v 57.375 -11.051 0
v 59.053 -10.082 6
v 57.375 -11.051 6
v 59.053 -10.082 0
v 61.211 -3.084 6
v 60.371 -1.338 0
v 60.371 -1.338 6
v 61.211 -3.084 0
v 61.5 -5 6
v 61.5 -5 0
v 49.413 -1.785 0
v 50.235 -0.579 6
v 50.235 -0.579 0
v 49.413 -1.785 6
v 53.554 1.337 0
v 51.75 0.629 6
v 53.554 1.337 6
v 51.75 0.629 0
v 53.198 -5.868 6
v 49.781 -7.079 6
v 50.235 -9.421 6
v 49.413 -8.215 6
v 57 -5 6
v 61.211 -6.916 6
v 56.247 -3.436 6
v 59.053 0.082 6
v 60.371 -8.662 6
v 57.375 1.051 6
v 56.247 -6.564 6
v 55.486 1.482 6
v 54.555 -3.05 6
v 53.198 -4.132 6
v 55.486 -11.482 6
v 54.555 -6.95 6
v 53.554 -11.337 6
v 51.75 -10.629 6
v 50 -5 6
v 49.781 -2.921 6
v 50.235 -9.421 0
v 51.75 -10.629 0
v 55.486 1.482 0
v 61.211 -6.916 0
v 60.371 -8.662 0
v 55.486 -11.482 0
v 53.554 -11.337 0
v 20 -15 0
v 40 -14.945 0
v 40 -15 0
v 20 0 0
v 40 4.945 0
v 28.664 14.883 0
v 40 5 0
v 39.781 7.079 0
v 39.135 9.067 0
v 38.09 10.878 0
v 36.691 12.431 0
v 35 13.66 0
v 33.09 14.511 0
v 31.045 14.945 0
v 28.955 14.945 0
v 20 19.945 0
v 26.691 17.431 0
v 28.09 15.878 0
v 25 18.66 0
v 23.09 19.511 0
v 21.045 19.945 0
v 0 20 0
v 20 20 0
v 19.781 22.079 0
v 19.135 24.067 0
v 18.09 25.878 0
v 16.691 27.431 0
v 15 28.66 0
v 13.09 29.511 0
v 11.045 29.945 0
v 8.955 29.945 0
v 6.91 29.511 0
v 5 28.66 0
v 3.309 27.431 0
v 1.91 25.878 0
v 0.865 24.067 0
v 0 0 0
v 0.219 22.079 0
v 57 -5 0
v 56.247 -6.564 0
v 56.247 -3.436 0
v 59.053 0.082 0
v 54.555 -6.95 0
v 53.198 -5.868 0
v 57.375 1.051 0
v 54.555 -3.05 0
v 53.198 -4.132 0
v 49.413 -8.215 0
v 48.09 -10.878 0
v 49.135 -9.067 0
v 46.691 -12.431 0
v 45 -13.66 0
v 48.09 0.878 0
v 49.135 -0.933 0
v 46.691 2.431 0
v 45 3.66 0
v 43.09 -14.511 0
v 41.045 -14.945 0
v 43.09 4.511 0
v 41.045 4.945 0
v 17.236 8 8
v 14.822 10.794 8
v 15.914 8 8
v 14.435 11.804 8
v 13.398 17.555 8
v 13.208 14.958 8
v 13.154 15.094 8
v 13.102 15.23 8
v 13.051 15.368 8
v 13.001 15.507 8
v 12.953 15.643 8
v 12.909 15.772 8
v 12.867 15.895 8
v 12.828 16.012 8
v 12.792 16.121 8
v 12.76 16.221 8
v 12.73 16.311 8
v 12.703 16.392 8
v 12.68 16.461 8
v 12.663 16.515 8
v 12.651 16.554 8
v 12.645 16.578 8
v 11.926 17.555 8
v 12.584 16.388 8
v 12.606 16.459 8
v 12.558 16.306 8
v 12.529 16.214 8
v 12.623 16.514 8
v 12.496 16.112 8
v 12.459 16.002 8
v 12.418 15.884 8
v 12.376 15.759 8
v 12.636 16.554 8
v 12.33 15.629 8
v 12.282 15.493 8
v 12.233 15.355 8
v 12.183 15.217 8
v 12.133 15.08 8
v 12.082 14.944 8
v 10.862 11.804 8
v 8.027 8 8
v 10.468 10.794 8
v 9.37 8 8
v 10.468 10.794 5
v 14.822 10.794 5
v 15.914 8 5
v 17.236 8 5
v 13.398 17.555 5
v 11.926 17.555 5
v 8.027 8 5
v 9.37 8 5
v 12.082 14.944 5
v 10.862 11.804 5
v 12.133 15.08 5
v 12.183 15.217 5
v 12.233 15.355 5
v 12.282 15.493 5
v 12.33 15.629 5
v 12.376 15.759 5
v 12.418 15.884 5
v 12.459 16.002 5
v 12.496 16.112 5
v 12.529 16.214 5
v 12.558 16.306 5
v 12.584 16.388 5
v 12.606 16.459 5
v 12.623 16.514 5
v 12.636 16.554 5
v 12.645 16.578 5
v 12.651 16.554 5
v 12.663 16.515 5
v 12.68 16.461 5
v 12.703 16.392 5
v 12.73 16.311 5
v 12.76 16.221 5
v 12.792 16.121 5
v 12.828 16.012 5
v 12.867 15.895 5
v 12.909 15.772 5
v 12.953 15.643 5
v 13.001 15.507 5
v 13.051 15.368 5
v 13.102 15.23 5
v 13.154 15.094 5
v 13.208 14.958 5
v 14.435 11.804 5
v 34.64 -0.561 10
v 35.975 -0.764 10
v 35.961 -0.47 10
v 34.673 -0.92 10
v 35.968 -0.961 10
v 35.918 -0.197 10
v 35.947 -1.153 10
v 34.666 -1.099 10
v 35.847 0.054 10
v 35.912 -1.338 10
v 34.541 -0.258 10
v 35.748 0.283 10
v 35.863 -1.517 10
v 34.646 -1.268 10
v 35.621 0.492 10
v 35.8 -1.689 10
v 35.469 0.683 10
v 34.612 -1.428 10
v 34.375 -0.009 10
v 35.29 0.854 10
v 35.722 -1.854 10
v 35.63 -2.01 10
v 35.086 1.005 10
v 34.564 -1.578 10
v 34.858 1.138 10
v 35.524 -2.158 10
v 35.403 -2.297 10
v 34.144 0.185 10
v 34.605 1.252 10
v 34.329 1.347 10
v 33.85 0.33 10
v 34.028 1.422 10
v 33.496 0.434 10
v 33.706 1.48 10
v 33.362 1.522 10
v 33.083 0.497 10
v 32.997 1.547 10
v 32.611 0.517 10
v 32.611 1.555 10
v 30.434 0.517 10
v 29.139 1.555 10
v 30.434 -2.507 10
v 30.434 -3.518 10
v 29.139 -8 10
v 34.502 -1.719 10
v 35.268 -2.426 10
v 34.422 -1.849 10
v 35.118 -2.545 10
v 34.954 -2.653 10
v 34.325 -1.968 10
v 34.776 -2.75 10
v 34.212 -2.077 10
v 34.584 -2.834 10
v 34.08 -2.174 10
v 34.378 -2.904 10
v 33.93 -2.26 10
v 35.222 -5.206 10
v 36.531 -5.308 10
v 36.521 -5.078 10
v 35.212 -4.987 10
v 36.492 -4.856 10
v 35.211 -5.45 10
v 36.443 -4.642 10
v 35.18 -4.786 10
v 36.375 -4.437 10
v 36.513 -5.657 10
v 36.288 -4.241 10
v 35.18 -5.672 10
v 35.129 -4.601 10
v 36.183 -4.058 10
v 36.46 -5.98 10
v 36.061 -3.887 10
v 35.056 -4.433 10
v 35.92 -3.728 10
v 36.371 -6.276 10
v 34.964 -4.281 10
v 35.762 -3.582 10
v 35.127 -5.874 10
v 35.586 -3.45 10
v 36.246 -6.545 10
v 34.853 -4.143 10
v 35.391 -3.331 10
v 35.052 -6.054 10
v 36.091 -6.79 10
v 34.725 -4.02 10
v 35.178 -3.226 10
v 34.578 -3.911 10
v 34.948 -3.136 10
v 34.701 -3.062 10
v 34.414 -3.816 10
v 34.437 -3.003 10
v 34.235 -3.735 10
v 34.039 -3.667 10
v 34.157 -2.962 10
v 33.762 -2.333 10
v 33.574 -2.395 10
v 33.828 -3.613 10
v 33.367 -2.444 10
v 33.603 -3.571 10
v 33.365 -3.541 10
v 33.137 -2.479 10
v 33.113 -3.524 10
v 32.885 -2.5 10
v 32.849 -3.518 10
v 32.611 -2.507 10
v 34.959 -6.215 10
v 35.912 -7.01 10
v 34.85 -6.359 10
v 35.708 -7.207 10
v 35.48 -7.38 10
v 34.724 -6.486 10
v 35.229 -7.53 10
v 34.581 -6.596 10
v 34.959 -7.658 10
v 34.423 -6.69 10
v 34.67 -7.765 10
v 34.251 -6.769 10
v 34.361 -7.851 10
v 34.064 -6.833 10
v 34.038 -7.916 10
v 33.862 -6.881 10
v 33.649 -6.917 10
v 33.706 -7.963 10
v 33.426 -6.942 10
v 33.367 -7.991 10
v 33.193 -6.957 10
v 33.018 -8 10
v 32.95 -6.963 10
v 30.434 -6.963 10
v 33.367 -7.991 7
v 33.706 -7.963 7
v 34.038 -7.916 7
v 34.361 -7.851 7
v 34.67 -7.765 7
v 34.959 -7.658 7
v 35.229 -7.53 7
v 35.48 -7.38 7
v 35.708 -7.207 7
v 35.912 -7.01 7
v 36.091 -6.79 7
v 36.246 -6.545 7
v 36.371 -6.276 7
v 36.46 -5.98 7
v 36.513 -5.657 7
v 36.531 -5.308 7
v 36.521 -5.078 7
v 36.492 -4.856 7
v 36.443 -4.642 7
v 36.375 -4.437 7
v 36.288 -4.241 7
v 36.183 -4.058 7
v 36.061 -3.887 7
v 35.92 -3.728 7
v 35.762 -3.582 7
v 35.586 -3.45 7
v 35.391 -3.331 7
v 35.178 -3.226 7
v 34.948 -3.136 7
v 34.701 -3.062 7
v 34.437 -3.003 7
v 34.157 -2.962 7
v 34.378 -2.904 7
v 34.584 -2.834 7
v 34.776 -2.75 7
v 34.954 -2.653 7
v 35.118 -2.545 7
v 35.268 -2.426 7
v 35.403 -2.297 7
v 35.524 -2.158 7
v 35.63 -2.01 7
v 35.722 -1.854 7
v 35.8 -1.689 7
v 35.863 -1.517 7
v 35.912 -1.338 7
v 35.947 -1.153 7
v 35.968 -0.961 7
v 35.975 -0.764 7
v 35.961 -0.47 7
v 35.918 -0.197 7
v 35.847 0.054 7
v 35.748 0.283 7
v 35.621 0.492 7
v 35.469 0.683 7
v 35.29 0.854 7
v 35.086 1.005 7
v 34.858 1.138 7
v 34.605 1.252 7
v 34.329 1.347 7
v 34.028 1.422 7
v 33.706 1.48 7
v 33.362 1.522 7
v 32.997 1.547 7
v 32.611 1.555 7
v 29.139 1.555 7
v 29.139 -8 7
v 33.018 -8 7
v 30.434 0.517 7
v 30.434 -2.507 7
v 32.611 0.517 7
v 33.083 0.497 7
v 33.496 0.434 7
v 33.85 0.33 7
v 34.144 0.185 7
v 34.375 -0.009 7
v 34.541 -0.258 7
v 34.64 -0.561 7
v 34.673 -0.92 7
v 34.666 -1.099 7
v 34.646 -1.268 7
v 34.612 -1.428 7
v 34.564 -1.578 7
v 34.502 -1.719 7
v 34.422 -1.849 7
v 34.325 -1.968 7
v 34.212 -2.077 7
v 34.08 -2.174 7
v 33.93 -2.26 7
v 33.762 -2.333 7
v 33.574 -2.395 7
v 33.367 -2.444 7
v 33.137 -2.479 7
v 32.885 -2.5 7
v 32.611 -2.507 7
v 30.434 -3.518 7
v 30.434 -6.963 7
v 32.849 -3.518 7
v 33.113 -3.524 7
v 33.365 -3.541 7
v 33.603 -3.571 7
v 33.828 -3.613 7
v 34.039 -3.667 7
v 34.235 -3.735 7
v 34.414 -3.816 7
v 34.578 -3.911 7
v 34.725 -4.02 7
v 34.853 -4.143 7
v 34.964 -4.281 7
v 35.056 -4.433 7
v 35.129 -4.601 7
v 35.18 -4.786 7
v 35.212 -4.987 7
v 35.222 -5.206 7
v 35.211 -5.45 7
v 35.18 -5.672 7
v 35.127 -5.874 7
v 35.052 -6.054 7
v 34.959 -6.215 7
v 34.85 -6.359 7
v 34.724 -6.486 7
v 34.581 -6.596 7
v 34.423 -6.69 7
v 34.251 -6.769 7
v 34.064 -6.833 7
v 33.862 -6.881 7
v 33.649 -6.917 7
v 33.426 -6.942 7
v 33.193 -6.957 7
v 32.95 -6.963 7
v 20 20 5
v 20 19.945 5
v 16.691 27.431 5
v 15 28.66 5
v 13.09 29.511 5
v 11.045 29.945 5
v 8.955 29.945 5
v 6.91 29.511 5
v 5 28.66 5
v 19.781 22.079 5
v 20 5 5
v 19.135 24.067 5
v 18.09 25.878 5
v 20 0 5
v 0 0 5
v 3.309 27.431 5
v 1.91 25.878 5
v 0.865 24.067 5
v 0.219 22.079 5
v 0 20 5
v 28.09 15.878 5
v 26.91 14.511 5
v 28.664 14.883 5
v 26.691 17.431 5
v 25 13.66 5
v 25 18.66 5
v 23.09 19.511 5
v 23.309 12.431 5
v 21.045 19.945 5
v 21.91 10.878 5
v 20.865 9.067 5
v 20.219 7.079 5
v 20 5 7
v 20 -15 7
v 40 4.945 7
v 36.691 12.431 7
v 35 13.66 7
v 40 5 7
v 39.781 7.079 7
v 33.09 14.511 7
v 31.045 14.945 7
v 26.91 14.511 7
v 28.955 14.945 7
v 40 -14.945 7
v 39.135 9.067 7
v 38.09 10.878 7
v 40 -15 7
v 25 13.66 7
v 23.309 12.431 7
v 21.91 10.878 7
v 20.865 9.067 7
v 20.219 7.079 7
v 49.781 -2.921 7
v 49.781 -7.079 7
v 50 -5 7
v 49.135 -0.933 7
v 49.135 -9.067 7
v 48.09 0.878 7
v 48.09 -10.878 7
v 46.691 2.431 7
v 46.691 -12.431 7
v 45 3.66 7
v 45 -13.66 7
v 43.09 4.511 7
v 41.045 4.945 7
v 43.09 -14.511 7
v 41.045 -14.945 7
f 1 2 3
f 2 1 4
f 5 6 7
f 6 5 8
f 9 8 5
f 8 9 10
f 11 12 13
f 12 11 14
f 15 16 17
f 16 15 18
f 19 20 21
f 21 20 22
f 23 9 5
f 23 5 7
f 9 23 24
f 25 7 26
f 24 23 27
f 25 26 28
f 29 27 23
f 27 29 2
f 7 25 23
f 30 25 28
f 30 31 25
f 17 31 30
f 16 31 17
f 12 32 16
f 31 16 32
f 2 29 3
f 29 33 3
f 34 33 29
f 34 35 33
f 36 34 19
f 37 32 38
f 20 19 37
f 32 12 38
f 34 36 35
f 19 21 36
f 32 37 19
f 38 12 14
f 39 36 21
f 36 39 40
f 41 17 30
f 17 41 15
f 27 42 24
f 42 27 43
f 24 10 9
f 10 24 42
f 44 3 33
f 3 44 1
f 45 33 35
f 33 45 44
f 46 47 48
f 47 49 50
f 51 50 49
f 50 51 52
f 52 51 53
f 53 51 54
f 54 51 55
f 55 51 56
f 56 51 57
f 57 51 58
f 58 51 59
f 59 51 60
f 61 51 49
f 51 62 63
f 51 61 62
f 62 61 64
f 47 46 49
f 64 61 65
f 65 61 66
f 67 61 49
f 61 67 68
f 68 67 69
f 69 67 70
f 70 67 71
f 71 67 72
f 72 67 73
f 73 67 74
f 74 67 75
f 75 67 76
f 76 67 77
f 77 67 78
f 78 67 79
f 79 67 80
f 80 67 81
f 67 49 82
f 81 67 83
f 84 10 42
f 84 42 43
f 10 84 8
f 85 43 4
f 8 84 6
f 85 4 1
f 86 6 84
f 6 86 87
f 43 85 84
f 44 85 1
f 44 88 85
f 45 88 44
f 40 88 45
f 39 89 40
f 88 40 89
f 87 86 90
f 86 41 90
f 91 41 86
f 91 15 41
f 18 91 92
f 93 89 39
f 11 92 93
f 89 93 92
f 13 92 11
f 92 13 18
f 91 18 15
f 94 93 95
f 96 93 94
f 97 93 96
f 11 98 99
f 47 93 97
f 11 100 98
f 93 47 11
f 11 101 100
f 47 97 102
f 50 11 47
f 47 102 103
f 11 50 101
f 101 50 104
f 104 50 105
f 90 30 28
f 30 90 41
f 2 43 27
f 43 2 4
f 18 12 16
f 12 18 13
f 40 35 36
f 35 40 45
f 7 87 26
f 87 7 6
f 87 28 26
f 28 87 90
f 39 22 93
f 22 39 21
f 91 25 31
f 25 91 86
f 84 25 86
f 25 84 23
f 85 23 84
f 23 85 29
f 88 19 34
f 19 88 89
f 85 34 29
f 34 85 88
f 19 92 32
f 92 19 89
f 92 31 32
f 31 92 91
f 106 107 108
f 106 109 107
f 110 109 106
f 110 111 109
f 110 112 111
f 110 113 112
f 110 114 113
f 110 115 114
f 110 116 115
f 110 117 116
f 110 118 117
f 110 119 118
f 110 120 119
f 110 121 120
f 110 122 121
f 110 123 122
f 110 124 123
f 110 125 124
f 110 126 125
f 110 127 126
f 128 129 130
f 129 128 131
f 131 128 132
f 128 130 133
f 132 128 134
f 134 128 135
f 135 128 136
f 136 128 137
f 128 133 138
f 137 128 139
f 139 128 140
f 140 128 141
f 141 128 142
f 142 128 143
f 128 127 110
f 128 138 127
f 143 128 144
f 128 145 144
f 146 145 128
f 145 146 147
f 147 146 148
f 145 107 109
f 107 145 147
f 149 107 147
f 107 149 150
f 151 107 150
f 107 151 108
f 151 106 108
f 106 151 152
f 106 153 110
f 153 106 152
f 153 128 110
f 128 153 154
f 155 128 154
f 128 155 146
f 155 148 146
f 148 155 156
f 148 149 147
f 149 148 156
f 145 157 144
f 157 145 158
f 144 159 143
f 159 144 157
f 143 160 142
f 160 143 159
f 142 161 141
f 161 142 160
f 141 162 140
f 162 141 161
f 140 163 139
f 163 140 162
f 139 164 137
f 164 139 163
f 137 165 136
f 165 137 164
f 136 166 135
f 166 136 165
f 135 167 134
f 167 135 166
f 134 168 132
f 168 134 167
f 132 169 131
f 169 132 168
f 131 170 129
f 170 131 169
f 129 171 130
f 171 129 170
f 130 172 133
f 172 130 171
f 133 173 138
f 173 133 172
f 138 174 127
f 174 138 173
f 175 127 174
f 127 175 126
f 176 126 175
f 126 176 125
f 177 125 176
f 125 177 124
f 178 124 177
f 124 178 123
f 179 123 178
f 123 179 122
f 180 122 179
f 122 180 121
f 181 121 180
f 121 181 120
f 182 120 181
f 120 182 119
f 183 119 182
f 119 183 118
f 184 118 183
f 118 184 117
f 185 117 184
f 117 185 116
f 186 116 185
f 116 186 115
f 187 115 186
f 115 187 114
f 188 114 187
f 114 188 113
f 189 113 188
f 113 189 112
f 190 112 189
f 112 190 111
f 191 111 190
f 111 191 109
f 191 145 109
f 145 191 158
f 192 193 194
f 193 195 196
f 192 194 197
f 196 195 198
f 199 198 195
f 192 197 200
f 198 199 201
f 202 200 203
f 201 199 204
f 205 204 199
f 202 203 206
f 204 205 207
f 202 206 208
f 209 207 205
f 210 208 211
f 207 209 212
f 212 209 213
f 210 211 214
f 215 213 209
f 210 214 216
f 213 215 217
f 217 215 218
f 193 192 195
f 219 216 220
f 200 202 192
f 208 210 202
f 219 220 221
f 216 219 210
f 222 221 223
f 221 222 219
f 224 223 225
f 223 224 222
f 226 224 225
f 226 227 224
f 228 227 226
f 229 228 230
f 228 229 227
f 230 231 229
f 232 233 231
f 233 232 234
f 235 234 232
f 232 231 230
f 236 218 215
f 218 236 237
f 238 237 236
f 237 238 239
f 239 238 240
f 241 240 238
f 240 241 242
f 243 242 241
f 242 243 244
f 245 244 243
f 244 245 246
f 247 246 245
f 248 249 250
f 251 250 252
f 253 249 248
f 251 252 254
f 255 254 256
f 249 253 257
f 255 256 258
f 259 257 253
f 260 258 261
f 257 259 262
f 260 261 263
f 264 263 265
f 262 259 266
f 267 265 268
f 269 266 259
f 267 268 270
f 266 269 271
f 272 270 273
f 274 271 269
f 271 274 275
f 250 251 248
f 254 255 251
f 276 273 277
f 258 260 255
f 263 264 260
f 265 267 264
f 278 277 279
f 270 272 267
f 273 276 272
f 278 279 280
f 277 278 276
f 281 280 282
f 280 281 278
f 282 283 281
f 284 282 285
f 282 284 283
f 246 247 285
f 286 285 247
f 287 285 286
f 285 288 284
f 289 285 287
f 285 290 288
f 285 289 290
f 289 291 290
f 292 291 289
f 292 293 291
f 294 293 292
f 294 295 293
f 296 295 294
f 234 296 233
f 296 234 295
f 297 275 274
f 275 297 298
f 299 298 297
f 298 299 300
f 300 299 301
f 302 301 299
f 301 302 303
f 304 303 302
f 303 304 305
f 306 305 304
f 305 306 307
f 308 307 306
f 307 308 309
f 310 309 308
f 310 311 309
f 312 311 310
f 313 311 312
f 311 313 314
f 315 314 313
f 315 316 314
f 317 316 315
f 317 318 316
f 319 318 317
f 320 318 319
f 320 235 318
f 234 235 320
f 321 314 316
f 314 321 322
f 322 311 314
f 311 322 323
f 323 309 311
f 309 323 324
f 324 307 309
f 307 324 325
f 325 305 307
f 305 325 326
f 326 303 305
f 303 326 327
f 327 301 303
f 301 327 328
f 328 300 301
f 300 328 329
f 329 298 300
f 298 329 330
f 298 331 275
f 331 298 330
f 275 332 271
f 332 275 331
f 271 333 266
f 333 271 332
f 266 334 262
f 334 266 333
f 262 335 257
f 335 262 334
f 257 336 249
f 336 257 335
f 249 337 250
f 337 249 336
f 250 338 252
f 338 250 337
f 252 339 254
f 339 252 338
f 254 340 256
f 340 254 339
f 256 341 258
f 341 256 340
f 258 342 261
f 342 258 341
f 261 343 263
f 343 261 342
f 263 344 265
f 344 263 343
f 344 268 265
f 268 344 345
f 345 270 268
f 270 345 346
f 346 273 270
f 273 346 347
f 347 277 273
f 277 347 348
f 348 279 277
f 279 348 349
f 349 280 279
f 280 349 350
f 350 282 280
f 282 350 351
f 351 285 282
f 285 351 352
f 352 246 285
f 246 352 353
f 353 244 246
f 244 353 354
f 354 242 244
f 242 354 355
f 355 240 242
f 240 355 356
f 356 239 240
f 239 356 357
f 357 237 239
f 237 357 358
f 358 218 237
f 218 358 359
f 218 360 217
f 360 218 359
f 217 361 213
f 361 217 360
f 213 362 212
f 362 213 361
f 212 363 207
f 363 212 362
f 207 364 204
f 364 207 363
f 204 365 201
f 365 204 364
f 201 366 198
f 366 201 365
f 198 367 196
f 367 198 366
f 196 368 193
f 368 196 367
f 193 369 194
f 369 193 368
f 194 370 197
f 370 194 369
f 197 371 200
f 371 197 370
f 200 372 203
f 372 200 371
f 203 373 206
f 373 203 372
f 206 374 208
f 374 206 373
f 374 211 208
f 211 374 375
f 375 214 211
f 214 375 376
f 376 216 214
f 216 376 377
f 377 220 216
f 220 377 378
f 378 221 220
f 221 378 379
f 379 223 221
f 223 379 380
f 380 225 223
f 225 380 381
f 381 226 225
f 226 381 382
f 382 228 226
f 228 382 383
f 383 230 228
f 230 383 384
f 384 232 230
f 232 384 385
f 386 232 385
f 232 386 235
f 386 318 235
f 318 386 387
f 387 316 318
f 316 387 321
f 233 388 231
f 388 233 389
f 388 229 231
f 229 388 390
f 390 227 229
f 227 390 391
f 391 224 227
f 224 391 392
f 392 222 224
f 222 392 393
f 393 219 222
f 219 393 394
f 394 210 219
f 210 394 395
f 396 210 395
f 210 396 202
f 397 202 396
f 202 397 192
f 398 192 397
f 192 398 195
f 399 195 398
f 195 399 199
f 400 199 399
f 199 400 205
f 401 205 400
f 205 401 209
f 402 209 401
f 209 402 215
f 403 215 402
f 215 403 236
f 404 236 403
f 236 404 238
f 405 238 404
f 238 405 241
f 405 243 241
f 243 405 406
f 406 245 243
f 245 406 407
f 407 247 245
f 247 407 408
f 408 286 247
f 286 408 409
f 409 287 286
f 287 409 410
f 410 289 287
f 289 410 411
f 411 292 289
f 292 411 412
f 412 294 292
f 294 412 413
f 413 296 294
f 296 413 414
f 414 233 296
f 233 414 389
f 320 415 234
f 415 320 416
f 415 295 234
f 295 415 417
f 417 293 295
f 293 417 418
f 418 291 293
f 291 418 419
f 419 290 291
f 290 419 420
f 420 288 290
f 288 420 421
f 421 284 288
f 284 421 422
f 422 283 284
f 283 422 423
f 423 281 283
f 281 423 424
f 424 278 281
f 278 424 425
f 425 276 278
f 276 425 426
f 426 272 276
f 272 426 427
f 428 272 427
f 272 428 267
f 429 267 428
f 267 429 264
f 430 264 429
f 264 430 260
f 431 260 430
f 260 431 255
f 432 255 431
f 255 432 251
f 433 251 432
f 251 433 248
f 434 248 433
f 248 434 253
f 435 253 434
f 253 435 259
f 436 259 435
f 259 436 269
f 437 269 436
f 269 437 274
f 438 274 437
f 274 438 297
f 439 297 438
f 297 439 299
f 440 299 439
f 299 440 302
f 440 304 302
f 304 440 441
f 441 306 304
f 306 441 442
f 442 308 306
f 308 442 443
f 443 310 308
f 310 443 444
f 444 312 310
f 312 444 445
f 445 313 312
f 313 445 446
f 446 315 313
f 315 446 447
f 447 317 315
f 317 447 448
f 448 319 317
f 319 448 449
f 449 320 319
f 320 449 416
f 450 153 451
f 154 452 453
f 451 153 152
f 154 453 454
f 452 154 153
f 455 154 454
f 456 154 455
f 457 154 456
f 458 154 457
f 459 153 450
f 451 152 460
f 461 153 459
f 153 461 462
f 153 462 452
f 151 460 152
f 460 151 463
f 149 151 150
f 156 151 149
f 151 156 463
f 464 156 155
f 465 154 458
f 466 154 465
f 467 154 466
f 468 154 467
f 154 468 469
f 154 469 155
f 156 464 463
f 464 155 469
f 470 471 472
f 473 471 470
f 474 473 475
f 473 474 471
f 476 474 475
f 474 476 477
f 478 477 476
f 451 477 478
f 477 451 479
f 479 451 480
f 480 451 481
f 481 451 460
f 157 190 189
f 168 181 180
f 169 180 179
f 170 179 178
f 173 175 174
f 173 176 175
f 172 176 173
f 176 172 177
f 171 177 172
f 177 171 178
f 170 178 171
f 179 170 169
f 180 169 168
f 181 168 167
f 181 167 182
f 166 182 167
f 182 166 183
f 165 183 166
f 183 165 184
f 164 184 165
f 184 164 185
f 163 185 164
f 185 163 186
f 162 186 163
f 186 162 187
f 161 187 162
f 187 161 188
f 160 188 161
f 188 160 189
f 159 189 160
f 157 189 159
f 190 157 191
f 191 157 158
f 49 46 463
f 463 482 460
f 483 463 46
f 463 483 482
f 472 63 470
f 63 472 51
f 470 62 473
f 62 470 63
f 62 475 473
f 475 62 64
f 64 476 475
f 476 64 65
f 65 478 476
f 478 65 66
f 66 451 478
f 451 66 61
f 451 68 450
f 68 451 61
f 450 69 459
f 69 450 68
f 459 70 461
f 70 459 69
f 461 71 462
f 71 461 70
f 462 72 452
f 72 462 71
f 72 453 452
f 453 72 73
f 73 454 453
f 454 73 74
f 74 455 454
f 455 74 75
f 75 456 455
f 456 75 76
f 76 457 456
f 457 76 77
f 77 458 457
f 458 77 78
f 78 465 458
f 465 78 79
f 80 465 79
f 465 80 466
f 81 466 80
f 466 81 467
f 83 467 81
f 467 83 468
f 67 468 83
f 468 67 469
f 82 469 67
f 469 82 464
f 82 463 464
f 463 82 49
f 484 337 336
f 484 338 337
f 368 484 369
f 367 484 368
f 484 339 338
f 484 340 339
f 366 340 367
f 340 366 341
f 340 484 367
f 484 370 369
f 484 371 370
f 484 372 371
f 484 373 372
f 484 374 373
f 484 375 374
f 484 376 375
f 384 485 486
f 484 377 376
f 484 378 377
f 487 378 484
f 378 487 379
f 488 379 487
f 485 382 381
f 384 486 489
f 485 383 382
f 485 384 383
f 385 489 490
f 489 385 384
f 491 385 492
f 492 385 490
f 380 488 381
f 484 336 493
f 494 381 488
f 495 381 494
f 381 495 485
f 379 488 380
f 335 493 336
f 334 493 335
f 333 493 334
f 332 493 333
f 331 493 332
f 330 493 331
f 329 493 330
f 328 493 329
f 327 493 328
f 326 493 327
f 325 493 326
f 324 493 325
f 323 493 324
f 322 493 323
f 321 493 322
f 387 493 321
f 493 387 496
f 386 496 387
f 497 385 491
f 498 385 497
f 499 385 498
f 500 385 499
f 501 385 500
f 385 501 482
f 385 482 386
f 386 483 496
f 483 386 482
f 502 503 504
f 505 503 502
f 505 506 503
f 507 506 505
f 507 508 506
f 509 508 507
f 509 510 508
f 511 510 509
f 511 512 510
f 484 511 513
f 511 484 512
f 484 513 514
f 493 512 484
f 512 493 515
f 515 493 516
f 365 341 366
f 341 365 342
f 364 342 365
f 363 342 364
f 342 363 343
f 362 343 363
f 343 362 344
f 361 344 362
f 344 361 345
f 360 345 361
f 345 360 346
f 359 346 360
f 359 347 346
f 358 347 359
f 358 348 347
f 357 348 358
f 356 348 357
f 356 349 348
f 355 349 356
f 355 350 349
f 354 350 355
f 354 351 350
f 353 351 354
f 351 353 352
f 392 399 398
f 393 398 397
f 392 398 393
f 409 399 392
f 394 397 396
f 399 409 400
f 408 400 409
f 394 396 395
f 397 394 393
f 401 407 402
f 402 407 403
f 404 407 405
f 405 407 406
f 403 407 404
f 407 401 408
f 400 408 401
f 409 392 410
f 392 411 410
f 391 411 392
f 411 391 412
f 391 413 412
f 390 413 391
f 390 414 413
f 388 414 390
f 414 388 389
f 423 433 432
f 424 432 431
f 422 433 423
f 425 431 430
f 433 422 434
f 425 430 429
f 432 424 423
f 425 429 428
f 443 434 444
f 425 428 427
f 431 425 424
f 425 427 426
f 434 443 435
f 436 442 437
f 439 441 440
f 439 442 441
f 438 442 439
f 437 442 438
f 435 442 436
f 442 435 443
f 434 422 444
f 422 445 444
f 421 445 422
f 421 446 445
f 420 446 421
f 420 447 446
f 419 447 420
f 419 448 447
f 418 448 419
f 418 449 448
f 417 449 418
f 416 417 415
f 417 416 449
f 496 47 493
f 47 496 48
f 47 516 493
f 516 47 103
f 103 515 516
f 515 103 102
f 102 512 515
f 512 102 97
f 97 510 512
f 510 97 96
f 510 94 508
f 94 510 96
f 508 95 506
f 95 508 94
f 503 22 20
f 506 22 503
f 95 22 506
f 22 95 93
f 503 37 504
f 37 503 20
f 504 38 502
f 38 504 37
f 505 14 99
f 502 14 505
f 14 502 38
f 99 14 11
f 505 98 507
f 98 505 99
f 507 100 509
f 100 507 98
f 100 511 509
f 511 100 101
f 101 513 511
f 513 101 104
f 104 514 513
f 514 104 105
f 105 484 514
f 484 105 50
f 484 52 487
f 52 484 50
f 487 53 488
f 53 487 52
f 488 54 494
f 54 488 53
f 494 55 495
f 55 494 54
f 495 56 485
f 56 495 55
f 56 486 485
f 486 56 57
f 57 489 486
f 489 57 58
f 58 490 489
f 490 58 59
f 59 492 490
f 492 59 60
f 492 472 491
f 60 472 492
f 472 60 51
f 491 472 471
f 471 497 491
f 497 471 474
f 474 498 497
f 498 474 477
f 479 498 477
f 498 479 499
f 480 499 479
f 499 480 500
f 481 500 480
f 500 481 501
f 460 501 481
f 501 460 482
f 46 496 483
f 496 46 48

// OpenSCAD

Left_heart_letter = "A"; //Just one letter
Rigth_heart_letter = "B";//Just one letter

linear_extrude(height = 8)
 
  translate([8, 8]) {
     
   text(Left_heart_letter);
 }
 
 linear_extrude(height = 10)
  translate([28, -8]) {
   text(Rigth_heart_letter);
 }


module flatstuff()
{
square(20);
translate([10,20,0]) circle(10);
translate([20,10,0]) circle(10);
}
linear_extrude(height=5) flatstuff();
module flatstuff2()
{
translate([20,-15,0])   
square(20);
translate([30,5,0]) circle(10);
translate([40,-5,0]) circle(10);
}

linear_extrude(height=7) flatstuff2();



difference(){
    translate([55,-5,0]) 
    cylinder(r=6.5, h=6);
    translate([55,-5,0]) 
    cylinder(r=2, h=6);
}

